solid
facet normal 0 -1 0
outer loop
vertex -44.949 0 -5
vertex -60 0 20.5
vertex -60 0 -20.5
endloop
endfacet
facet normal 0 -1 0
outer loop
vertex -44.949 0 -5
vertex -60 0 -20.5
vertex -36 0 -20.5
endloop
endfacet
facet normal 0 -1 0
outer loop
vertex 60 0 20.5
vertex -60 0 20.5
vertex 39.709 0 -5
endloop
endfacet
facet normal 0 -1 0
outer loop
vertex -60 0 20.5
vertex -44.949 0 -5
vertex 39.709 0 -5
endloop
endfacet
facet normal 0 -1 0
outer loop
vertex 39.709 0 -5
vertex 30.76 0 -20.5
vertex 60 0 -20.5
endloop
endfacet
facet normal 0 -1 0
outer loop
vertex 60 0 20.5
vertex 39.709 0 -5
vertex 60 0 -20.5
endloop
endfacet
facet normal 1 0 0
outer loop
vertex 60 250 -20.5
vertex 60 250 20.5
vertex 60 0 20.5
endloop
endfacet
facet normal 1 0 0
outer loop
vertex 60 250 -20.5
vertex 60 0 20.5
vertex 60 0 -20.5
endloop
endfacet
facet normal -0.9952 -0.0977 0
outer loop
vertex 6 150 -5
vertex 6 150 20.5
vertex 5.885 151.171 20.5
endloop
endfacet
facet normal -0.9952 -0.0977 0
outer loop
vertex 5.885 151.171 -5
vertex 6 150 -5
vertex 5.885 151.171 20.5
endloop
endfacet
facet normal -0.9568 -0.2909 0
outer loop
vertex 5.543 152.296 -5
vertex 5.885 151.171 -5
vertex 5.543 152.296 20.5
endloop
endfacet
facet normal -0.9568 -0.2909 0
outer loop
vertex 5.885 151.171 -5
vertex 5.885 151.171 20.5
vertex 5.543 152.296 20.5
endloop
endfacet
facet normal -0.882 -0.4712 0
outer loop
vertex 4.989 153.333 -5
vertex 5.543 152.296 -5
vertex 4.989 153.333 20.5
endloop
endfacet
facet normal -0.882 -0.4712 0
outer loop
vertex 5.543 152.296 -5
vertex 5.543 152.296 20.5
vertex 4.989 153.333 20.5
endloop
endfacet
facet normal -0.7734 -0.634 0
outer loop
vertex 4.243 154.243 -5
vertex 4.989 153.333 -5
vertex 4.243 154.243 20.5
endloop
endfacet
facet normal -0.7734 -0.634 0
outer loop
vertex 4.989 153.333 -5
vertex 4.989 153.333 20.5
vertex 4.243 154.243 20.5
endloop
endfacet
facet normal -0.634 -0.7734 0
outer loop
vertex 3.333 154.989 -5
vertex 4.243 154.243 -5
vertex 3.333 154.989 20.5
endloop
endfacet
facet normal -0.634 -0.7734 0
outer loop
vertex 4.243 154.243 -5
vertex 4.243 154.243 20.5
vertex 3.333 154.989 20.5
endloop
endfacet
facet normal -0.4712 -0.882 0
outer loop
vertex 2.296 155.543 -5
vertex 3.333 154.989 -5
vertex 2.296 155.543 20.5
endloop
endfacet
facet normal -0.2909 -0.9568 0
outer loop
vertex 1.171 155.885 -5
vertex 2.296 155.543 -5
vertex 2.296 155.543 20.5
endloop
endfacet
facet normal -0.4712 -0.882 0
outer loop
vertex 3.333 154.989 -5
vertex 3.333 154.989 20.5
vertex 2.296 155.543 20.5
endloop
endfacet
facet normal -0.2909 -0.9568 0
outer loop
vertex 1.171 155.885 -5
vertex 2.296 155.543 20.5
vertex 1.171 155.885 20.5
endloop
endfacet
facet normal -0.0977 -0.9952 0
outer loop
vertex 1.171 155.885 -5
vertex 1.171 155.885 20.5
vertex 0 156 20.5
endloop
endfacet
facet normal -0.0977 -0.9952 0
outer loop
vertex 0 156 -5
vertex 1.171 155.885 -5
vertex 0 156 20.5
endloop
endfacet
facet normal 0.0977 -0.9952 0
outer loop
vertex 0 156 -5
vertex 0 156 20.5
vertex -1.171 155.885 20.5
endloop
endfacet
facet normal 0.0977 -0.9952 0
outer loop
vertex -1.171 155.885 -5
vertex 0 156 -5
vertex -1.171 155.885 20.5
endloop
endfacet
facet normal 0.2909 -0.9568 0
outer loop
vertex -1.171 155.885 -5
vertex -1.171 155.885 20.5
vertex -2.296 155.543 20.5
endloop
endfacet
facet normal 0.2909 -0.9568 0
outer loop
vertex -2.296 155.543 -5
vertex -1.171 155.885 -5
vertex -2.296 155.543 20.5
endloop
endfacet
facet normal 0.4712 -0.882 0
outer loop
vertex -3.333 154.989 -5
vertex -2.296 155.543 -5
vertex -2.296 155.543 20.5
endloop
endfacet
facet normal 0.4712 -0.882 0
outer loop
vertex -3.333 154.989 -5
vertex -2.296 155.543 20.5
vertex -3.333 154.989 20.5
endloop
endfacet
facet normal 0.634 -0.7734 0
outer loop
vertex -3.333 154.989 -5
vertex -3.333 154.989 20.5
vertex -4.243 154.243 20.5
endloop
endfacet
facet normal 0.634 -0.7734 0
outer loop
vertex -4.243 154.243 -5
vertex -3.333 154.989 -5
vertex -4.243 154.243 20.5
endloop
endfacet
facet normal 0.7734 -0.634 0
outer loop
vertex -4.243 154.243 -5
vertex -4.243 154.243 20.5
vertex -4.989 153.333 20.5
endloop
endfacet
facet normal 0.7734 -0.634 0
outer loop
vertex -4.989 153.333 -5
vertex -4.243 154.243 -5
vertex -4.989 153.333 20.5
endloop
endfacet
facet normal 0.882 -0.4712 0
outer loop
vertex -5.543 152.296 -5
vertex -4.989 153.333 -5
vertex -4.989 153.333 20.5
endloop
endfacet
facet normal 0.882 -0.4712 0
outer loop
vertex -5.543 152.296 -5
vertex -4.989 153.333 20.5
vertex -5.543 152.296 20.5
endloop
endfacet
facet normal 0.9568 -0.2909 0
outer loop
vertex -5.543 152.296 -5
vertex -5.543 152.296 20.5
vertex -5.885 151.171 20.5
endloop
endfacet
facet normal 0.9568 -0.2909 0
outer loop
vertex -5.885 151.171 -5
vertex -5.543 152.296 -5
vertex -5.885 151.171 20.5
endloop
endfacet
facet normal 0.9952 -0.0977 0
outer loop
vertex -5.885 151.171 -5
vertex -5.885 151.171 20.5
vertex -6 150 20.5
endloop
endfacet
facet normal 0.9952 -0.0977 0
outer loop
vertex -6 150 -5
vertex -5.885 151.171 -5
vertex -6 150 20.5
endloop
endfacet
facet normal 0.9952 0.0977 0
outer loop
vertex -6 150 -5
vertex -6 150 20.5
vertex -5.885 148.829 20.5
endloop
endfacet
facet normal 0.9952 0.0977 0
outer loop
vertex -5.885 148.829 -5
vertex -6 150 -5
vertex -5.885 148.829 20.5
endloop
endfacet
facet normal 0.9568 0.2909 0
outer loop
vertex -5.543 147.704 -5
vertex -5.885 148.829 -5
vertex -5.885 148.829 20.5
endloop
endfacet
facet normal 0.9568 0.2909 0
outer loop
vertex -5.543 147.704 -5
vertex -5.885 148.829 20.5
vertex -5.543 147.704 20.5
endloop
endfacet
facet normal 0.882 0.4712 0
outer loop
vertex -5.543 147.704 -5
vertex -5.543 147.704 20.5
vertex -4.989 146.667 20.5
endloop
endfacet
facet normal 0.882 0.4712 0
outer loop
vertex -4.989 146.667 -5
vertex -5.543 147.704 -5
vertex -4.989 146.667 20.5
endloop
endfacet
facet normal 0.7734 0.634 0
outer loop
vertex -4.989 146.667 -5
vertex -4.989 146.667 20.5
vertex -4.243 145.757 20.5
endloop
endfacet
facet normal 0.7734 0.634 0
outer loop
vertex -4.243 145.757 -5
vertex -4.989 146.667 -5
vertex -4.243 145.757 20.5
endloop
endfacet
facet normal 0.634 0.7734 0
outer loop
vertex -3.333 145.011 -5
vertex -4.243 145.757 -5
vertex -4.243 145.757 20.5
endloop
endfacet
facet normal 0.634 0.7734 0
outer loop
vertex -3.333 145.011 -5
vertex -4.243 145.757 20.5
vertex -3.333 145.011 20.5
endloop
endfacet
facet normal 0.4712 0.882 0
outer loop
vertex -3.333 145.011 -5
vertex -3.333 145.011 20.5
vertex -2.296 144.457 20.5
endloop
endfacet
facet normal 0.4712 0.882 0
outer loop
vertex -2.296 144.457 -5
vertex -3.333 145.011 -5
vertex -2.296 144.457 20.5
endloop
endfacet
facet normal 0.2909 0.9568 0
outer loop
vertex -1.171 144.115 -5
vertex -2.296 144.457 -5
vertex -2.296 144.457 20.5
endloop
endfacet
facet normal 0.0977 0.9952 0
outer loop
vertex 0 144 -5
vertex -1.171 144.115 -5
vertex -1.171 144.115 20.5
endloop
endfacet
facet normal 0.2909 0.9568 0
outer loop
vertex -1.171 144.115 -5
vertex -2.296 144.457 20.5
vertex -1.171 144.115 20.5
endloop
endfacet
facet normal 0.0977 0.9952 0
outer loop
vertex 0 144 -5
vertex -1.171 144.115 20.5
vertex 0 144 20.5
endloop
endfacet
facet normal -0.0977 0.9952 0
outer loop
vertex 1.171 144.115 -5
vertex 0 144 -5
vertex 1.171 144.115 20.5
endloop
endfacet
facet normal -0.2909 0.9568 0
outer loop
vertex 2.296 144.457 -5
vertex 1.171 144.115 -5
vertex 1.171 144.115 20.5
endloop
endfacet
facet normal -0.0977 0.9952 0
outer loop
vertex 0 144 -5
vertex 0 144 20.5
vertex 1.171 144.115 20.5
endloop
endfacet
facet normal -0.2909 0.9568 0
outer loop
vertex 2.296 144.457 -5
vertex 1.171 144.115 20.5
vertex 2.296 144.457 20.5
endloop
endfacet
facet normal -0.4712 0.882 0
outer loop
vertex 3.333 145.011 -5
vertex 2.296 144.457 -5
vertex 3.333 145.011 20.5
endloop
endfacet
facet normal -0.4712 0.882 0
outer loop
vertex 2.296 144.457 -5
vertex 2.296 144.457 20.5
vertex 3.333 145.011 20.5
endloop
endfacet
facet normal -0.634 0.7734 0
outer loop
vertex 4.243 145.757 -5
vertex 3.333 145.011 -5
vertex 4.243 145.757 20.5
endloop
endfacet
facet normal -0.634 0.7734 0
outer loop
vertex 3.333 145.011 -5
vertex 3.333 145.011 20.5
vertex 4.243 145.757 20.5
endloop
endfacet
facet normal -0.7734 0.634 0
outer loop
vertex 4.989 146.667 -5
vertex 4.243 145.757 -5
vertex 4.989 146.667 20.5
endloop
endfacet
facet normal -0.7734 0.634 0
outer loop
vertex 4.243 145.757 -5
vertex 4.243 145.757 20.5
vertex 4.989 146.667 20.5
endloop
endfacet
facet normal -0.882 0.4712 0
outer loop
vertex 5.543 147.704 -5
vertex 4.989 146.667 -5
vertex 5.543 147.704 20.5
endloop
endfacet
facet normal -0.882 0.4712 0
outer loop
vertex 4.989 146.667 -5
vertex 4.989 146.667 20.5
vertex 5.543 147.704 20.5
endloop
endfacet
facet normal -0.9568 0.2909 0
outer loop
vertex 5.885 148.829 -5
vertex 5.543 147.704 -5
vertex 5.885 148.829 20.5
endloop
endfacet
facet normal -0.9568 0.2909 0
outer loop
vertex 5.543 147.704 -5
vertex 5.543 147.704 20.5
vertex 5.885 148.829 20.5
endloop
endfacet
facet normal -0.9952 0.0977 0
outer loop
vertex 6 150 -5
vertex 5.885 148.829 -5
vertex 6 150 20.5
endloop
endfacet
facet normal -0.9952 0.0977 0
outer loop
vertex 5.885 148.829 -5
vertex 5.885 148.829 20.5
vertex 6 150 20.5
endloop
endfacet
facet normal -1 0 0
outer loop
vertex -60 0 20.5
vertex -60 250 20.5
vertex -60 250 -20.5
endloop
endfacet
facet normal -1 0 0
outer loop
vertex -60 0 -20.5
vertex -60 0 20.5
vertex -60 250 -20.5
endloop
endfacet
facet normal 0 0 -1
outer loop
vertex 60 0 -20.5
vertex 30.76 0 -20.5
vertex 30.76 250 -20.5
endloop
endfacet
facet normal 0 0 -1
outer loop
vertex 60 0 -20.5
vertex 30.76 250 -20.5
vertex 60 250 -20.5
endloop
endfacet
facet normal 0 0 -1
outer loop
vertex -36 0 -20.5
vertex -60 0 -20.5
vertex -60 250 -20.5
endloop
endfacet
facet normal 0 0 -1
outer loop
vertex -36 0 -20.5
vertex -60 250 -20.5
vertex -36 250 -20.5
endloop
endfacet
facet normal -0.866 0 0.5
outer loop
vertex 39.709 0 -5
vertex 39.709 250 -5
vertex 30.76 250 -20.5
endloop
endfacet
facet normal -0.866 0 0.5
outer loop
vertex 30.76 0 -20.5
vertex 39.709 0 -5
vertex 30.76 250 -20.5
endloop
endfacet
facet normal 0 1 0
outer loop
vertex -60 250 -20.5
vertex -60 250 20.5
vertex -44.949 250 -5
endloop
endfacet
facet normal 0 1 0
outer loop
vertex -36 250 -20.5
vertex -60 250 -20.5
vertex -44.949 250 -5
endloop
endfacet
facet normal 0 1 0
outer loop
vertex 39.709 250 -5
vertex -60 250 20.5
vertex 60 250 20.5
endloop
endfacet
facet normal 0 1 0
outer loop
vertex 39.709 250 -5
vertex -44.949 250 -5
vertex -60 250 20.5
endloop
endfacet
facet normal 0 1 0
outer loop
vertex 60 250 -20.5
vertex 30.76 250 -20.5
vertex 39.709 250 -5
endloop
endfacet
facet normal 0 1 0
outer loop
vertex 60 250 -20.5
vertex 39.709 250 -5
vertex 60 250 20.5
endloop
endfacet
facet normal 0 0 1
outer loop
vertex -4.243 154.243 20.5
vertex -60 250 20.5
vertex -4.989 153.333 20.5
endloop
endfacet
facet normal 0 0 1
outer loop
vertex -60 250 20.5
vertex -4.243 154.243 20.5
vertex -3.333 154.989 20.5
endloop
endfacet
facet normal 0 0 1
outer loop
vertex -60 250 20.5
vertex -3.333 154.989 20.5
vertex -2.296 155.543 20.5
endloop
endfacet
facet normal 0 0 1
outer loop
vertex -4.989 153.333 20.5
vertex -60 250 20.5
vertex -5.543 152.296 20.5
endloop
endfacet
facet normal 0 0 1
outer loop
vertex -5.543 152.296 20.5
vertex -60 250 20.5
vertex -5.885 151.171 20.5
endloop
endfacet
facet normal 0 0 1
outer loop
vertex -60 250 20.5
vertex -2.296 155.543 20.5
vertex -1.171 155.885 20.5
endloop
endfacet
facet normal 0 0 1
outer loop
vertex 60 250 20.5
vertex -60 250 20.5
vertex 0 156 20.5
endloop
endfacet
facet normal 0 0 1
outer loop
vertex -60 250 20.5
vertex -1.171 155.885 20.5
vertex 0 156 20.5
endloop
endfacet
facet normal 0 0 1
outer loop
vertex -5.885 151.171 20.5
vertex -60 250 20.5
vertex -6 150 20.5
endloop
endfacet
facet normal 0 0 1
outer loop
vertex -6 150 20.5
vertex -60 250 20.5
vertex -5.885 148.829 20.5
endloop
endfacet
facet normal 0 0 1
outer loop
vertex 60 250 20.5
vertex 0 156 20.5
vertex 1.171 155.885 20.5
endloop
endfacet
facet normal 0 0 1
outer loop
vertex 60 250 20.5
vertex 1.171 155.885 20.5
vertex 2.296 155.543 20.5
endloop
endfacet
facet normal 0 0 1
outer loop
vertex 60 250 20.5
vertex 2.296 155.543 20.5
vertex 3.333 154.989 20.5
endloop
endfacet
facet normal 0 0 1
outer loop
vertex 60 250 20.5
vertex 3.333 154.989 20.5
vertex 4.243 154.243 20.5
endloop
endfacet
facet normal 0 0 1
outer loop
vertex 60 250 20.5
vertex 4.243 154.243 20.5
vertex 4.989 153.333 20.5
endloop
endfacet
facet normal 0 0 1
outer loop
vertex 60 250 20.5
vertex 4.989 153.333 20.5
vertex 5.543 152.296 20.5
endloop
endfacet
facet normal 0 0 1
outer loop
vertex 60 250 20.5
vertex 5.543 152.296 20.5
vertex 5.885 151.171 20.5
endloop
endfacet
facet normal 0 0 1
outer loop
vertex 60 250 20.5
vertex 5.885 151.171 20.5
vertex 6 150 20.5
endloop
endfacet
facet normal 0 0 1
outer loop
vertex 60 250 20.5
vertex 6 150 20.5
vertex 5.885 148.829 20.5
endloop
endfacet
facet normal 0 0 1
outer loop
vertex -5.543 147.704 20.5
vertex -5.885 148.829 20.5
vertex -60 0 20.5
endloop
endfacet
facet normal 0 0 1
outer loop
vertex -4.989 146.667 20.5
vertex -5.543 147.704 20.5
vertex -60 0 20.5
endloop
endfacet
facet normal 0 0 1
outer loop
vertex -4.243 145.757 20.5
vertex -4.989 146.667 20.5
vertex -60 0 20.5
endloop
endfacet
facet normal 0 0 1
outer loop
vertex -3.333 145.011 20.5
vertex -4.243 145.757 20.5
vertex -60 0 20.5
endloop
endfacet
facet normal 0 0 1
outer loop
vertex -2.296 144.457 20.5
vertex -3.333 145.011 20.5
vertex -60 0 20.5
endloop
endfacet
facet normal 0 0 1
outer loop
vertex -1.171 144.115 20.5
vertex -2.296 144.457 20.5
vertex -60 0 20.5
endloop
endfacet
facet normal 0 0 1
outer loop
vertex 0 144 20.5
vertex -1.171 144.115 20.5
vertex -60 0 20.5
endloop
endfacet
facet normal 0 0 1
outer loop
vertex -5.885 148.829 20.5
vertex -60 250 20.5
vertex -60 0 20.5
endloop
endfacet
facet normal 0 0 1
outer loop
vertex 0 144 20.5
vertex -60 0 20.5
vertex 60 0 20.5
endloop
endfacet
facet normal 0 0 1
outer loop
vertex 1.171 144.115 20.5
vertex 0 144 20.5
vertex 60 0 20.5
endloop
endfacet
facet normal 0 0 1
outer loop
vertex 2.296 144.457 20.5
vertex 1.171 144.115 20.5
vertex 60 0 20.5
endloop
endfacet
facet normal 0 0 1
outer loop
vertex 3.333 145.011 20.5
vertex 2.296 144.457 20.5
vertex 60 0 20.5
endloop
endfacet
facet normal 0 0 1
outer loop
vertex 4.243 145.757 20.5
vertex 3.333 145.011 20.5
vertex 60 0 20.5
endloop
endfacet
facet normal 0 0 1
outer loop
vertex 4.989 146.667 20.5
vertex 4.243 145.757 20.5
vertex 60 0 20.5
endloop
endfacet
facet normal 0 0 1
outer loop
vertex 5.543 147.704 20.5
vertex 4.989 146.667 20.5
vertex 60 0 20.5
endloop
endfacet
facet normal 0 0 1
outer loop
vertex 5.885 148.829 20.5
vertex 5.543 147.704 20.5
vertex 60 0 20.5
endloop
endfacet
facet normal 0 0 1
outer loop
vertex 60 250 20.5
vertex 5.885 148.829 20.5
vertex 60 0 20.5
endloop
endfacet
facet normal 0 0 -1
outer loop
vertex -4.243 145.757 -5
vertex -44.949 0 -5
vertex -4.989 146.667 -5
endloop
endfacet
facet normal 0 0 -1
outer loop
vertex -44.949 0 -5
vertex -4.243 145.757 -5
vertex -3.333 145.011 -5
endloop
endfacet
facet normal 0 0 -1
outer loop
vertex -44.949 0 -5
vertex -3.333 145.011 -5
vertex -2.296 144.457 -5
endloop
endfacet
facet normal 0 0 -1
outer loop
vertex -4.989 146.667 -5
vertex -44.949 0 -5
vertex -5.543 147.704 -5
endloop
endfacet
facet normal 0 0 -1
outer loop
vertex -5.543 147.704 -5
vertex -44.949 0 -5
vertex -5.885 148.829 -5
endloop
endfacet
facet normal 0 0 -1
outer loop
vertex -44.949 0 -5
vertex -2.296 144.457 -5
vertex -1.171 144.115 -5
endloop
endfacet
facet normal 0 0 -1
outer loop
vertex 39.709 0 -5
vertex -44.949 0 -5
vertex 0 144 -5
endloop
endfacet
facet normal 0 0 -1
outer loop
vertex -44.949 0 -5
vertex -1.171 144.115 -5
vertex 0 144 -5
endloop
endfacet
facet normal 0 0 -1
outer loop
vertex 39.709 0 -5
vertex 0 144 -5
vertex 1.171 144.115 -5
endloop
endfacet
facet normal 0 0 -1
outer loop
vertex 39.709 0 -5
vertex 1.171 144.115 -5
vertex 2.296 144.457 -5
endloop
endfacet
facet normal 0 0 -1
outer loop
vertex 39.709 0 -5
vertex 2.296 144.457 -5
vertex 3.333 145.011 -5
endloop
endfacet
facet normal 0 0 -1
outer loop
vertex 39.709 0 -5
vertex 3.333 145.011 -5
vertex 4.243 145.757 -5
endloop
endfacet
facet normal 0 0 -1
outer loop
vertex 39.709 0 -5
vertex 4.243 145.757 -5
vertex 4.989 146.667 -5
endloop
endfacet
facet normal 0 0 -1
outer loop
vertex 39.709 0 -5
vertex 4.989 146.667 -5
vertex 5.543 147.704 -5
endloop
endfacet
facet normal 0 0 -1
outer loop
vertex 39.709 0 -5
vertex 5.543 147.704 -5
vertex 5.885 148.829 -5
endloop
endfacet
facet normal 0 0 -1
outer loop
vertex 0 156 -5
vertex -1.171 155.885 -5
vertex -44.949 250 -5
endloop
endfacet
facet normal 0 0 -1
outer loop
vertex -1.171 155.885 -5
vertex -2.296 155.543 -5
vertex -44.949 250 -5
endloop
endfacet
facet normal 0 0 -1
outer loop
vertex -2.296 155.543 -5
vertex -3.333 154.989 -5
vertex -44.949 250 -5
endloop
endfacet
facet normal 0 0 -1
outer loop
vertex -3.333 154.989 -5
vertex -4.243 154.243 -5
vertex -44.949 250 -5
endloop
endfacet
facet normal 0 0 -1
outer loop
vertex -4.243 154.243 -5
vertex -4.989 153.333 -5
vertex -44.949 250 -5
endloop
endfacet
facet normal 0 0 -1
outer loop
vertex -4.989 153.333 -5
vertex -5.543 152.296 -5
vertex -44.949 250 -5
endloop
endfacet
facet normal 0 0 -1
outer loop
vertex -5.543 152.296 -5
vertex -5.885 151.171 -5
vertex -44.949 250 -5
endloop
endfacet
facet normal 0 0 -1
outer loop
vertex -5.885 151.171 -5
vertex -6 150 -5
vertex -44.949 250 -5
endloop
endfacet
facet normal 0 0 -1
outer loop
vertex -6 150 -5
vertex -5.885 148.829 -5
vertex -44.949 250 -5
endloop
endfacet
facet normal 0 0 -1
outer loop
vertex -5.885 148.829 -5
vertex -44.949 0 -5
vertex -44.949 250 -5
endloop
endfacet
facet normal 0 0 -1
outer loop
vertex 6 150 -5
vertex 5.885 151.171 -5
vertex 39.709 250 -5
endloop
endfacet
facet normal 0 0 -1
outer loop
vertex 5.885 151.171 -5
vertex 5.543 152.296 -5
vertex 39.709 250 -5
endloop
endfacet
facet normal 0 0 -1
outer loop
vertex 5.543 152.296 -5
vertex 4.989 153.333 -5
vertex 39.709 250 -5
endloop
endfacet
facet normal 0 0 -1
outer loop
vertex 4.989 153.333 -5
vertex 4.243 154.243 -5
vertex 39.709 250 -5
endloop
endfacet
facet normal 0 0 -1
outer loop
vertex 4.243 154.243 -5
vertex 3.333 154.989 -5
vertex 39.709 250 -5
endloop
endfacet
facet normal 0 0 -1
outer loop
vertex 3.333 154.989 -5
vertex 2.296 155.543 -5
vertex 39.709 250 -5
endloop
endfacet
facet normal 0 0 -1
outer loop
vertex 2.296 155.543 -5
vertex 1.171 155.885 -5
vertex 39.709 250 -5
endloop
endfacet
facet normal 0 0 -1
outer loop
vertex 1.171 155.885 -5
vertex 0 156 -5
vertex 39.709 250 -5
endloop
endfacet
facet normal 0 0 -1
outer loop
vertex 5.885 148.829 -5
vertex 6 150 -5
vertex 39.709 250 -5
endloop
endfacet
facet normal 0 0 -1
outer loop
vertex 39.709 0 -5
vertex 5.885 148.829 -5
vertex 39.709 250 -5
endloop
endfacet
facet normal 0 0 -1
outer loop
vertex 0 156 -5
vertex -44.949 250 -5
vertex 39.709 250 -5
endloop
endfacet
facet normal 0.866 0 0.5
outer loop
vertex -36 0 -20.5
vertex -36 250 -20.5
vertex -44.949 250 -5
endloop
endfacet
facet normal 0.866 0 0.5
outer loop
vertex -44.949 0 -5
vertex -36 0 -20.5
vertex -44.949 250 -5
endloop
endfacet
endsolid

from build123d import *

# Parameters (mm, degrees)
SKETCH1_W           = 120
SKETCH1_H           = 41
BOSS_EXTRUDE1_DEPTH = 250
CUT_EXTRUDE1_DEPTH  = 250
SKETCH3_R           = 6
CUT_EXTRUDE2_DEPTH  = 250


with BuildPart() as part:
    # Sketch1 → Boss-Extrude1 (new body)
    with BuildSketch(Plane(origin=(0, 0, 0), x_dir=(1, 0, 0), z_dir=(0, 1, 0))):
        Rectangle(SKETCH1_W, SKETCH1_H)
    extrude(amount=BOSS_EXTRUDE1_DEPTH)

    # Sketch2 → Cut-Extrude1 (cut)
    with BuildSketch(Plane(origin=(0, 250, 0), x_dir=(1, 0, 0), z_dir=(0, 1, 0))):
        Polygon((-36, 20.5), (-44.948929172, 5), (39.708929172, 5), (30.76, 20.5), align=None)
    extrude(amount=-CUT_EXTRUDE1_DEPTH, mode=Mode.SUBTRACT)

    # Sketch3 → Cut-Extrude2 (cut)
    with BuildSketch(Plane.XY.offset(20.5)):
        with Locations((0, 150)):
            Circle(SKETCH3_R)
    extrude(amount=-CUT_EXTRUDE2_DEPTH, mode=Mode.SUBTRACT)


solid = part.part
